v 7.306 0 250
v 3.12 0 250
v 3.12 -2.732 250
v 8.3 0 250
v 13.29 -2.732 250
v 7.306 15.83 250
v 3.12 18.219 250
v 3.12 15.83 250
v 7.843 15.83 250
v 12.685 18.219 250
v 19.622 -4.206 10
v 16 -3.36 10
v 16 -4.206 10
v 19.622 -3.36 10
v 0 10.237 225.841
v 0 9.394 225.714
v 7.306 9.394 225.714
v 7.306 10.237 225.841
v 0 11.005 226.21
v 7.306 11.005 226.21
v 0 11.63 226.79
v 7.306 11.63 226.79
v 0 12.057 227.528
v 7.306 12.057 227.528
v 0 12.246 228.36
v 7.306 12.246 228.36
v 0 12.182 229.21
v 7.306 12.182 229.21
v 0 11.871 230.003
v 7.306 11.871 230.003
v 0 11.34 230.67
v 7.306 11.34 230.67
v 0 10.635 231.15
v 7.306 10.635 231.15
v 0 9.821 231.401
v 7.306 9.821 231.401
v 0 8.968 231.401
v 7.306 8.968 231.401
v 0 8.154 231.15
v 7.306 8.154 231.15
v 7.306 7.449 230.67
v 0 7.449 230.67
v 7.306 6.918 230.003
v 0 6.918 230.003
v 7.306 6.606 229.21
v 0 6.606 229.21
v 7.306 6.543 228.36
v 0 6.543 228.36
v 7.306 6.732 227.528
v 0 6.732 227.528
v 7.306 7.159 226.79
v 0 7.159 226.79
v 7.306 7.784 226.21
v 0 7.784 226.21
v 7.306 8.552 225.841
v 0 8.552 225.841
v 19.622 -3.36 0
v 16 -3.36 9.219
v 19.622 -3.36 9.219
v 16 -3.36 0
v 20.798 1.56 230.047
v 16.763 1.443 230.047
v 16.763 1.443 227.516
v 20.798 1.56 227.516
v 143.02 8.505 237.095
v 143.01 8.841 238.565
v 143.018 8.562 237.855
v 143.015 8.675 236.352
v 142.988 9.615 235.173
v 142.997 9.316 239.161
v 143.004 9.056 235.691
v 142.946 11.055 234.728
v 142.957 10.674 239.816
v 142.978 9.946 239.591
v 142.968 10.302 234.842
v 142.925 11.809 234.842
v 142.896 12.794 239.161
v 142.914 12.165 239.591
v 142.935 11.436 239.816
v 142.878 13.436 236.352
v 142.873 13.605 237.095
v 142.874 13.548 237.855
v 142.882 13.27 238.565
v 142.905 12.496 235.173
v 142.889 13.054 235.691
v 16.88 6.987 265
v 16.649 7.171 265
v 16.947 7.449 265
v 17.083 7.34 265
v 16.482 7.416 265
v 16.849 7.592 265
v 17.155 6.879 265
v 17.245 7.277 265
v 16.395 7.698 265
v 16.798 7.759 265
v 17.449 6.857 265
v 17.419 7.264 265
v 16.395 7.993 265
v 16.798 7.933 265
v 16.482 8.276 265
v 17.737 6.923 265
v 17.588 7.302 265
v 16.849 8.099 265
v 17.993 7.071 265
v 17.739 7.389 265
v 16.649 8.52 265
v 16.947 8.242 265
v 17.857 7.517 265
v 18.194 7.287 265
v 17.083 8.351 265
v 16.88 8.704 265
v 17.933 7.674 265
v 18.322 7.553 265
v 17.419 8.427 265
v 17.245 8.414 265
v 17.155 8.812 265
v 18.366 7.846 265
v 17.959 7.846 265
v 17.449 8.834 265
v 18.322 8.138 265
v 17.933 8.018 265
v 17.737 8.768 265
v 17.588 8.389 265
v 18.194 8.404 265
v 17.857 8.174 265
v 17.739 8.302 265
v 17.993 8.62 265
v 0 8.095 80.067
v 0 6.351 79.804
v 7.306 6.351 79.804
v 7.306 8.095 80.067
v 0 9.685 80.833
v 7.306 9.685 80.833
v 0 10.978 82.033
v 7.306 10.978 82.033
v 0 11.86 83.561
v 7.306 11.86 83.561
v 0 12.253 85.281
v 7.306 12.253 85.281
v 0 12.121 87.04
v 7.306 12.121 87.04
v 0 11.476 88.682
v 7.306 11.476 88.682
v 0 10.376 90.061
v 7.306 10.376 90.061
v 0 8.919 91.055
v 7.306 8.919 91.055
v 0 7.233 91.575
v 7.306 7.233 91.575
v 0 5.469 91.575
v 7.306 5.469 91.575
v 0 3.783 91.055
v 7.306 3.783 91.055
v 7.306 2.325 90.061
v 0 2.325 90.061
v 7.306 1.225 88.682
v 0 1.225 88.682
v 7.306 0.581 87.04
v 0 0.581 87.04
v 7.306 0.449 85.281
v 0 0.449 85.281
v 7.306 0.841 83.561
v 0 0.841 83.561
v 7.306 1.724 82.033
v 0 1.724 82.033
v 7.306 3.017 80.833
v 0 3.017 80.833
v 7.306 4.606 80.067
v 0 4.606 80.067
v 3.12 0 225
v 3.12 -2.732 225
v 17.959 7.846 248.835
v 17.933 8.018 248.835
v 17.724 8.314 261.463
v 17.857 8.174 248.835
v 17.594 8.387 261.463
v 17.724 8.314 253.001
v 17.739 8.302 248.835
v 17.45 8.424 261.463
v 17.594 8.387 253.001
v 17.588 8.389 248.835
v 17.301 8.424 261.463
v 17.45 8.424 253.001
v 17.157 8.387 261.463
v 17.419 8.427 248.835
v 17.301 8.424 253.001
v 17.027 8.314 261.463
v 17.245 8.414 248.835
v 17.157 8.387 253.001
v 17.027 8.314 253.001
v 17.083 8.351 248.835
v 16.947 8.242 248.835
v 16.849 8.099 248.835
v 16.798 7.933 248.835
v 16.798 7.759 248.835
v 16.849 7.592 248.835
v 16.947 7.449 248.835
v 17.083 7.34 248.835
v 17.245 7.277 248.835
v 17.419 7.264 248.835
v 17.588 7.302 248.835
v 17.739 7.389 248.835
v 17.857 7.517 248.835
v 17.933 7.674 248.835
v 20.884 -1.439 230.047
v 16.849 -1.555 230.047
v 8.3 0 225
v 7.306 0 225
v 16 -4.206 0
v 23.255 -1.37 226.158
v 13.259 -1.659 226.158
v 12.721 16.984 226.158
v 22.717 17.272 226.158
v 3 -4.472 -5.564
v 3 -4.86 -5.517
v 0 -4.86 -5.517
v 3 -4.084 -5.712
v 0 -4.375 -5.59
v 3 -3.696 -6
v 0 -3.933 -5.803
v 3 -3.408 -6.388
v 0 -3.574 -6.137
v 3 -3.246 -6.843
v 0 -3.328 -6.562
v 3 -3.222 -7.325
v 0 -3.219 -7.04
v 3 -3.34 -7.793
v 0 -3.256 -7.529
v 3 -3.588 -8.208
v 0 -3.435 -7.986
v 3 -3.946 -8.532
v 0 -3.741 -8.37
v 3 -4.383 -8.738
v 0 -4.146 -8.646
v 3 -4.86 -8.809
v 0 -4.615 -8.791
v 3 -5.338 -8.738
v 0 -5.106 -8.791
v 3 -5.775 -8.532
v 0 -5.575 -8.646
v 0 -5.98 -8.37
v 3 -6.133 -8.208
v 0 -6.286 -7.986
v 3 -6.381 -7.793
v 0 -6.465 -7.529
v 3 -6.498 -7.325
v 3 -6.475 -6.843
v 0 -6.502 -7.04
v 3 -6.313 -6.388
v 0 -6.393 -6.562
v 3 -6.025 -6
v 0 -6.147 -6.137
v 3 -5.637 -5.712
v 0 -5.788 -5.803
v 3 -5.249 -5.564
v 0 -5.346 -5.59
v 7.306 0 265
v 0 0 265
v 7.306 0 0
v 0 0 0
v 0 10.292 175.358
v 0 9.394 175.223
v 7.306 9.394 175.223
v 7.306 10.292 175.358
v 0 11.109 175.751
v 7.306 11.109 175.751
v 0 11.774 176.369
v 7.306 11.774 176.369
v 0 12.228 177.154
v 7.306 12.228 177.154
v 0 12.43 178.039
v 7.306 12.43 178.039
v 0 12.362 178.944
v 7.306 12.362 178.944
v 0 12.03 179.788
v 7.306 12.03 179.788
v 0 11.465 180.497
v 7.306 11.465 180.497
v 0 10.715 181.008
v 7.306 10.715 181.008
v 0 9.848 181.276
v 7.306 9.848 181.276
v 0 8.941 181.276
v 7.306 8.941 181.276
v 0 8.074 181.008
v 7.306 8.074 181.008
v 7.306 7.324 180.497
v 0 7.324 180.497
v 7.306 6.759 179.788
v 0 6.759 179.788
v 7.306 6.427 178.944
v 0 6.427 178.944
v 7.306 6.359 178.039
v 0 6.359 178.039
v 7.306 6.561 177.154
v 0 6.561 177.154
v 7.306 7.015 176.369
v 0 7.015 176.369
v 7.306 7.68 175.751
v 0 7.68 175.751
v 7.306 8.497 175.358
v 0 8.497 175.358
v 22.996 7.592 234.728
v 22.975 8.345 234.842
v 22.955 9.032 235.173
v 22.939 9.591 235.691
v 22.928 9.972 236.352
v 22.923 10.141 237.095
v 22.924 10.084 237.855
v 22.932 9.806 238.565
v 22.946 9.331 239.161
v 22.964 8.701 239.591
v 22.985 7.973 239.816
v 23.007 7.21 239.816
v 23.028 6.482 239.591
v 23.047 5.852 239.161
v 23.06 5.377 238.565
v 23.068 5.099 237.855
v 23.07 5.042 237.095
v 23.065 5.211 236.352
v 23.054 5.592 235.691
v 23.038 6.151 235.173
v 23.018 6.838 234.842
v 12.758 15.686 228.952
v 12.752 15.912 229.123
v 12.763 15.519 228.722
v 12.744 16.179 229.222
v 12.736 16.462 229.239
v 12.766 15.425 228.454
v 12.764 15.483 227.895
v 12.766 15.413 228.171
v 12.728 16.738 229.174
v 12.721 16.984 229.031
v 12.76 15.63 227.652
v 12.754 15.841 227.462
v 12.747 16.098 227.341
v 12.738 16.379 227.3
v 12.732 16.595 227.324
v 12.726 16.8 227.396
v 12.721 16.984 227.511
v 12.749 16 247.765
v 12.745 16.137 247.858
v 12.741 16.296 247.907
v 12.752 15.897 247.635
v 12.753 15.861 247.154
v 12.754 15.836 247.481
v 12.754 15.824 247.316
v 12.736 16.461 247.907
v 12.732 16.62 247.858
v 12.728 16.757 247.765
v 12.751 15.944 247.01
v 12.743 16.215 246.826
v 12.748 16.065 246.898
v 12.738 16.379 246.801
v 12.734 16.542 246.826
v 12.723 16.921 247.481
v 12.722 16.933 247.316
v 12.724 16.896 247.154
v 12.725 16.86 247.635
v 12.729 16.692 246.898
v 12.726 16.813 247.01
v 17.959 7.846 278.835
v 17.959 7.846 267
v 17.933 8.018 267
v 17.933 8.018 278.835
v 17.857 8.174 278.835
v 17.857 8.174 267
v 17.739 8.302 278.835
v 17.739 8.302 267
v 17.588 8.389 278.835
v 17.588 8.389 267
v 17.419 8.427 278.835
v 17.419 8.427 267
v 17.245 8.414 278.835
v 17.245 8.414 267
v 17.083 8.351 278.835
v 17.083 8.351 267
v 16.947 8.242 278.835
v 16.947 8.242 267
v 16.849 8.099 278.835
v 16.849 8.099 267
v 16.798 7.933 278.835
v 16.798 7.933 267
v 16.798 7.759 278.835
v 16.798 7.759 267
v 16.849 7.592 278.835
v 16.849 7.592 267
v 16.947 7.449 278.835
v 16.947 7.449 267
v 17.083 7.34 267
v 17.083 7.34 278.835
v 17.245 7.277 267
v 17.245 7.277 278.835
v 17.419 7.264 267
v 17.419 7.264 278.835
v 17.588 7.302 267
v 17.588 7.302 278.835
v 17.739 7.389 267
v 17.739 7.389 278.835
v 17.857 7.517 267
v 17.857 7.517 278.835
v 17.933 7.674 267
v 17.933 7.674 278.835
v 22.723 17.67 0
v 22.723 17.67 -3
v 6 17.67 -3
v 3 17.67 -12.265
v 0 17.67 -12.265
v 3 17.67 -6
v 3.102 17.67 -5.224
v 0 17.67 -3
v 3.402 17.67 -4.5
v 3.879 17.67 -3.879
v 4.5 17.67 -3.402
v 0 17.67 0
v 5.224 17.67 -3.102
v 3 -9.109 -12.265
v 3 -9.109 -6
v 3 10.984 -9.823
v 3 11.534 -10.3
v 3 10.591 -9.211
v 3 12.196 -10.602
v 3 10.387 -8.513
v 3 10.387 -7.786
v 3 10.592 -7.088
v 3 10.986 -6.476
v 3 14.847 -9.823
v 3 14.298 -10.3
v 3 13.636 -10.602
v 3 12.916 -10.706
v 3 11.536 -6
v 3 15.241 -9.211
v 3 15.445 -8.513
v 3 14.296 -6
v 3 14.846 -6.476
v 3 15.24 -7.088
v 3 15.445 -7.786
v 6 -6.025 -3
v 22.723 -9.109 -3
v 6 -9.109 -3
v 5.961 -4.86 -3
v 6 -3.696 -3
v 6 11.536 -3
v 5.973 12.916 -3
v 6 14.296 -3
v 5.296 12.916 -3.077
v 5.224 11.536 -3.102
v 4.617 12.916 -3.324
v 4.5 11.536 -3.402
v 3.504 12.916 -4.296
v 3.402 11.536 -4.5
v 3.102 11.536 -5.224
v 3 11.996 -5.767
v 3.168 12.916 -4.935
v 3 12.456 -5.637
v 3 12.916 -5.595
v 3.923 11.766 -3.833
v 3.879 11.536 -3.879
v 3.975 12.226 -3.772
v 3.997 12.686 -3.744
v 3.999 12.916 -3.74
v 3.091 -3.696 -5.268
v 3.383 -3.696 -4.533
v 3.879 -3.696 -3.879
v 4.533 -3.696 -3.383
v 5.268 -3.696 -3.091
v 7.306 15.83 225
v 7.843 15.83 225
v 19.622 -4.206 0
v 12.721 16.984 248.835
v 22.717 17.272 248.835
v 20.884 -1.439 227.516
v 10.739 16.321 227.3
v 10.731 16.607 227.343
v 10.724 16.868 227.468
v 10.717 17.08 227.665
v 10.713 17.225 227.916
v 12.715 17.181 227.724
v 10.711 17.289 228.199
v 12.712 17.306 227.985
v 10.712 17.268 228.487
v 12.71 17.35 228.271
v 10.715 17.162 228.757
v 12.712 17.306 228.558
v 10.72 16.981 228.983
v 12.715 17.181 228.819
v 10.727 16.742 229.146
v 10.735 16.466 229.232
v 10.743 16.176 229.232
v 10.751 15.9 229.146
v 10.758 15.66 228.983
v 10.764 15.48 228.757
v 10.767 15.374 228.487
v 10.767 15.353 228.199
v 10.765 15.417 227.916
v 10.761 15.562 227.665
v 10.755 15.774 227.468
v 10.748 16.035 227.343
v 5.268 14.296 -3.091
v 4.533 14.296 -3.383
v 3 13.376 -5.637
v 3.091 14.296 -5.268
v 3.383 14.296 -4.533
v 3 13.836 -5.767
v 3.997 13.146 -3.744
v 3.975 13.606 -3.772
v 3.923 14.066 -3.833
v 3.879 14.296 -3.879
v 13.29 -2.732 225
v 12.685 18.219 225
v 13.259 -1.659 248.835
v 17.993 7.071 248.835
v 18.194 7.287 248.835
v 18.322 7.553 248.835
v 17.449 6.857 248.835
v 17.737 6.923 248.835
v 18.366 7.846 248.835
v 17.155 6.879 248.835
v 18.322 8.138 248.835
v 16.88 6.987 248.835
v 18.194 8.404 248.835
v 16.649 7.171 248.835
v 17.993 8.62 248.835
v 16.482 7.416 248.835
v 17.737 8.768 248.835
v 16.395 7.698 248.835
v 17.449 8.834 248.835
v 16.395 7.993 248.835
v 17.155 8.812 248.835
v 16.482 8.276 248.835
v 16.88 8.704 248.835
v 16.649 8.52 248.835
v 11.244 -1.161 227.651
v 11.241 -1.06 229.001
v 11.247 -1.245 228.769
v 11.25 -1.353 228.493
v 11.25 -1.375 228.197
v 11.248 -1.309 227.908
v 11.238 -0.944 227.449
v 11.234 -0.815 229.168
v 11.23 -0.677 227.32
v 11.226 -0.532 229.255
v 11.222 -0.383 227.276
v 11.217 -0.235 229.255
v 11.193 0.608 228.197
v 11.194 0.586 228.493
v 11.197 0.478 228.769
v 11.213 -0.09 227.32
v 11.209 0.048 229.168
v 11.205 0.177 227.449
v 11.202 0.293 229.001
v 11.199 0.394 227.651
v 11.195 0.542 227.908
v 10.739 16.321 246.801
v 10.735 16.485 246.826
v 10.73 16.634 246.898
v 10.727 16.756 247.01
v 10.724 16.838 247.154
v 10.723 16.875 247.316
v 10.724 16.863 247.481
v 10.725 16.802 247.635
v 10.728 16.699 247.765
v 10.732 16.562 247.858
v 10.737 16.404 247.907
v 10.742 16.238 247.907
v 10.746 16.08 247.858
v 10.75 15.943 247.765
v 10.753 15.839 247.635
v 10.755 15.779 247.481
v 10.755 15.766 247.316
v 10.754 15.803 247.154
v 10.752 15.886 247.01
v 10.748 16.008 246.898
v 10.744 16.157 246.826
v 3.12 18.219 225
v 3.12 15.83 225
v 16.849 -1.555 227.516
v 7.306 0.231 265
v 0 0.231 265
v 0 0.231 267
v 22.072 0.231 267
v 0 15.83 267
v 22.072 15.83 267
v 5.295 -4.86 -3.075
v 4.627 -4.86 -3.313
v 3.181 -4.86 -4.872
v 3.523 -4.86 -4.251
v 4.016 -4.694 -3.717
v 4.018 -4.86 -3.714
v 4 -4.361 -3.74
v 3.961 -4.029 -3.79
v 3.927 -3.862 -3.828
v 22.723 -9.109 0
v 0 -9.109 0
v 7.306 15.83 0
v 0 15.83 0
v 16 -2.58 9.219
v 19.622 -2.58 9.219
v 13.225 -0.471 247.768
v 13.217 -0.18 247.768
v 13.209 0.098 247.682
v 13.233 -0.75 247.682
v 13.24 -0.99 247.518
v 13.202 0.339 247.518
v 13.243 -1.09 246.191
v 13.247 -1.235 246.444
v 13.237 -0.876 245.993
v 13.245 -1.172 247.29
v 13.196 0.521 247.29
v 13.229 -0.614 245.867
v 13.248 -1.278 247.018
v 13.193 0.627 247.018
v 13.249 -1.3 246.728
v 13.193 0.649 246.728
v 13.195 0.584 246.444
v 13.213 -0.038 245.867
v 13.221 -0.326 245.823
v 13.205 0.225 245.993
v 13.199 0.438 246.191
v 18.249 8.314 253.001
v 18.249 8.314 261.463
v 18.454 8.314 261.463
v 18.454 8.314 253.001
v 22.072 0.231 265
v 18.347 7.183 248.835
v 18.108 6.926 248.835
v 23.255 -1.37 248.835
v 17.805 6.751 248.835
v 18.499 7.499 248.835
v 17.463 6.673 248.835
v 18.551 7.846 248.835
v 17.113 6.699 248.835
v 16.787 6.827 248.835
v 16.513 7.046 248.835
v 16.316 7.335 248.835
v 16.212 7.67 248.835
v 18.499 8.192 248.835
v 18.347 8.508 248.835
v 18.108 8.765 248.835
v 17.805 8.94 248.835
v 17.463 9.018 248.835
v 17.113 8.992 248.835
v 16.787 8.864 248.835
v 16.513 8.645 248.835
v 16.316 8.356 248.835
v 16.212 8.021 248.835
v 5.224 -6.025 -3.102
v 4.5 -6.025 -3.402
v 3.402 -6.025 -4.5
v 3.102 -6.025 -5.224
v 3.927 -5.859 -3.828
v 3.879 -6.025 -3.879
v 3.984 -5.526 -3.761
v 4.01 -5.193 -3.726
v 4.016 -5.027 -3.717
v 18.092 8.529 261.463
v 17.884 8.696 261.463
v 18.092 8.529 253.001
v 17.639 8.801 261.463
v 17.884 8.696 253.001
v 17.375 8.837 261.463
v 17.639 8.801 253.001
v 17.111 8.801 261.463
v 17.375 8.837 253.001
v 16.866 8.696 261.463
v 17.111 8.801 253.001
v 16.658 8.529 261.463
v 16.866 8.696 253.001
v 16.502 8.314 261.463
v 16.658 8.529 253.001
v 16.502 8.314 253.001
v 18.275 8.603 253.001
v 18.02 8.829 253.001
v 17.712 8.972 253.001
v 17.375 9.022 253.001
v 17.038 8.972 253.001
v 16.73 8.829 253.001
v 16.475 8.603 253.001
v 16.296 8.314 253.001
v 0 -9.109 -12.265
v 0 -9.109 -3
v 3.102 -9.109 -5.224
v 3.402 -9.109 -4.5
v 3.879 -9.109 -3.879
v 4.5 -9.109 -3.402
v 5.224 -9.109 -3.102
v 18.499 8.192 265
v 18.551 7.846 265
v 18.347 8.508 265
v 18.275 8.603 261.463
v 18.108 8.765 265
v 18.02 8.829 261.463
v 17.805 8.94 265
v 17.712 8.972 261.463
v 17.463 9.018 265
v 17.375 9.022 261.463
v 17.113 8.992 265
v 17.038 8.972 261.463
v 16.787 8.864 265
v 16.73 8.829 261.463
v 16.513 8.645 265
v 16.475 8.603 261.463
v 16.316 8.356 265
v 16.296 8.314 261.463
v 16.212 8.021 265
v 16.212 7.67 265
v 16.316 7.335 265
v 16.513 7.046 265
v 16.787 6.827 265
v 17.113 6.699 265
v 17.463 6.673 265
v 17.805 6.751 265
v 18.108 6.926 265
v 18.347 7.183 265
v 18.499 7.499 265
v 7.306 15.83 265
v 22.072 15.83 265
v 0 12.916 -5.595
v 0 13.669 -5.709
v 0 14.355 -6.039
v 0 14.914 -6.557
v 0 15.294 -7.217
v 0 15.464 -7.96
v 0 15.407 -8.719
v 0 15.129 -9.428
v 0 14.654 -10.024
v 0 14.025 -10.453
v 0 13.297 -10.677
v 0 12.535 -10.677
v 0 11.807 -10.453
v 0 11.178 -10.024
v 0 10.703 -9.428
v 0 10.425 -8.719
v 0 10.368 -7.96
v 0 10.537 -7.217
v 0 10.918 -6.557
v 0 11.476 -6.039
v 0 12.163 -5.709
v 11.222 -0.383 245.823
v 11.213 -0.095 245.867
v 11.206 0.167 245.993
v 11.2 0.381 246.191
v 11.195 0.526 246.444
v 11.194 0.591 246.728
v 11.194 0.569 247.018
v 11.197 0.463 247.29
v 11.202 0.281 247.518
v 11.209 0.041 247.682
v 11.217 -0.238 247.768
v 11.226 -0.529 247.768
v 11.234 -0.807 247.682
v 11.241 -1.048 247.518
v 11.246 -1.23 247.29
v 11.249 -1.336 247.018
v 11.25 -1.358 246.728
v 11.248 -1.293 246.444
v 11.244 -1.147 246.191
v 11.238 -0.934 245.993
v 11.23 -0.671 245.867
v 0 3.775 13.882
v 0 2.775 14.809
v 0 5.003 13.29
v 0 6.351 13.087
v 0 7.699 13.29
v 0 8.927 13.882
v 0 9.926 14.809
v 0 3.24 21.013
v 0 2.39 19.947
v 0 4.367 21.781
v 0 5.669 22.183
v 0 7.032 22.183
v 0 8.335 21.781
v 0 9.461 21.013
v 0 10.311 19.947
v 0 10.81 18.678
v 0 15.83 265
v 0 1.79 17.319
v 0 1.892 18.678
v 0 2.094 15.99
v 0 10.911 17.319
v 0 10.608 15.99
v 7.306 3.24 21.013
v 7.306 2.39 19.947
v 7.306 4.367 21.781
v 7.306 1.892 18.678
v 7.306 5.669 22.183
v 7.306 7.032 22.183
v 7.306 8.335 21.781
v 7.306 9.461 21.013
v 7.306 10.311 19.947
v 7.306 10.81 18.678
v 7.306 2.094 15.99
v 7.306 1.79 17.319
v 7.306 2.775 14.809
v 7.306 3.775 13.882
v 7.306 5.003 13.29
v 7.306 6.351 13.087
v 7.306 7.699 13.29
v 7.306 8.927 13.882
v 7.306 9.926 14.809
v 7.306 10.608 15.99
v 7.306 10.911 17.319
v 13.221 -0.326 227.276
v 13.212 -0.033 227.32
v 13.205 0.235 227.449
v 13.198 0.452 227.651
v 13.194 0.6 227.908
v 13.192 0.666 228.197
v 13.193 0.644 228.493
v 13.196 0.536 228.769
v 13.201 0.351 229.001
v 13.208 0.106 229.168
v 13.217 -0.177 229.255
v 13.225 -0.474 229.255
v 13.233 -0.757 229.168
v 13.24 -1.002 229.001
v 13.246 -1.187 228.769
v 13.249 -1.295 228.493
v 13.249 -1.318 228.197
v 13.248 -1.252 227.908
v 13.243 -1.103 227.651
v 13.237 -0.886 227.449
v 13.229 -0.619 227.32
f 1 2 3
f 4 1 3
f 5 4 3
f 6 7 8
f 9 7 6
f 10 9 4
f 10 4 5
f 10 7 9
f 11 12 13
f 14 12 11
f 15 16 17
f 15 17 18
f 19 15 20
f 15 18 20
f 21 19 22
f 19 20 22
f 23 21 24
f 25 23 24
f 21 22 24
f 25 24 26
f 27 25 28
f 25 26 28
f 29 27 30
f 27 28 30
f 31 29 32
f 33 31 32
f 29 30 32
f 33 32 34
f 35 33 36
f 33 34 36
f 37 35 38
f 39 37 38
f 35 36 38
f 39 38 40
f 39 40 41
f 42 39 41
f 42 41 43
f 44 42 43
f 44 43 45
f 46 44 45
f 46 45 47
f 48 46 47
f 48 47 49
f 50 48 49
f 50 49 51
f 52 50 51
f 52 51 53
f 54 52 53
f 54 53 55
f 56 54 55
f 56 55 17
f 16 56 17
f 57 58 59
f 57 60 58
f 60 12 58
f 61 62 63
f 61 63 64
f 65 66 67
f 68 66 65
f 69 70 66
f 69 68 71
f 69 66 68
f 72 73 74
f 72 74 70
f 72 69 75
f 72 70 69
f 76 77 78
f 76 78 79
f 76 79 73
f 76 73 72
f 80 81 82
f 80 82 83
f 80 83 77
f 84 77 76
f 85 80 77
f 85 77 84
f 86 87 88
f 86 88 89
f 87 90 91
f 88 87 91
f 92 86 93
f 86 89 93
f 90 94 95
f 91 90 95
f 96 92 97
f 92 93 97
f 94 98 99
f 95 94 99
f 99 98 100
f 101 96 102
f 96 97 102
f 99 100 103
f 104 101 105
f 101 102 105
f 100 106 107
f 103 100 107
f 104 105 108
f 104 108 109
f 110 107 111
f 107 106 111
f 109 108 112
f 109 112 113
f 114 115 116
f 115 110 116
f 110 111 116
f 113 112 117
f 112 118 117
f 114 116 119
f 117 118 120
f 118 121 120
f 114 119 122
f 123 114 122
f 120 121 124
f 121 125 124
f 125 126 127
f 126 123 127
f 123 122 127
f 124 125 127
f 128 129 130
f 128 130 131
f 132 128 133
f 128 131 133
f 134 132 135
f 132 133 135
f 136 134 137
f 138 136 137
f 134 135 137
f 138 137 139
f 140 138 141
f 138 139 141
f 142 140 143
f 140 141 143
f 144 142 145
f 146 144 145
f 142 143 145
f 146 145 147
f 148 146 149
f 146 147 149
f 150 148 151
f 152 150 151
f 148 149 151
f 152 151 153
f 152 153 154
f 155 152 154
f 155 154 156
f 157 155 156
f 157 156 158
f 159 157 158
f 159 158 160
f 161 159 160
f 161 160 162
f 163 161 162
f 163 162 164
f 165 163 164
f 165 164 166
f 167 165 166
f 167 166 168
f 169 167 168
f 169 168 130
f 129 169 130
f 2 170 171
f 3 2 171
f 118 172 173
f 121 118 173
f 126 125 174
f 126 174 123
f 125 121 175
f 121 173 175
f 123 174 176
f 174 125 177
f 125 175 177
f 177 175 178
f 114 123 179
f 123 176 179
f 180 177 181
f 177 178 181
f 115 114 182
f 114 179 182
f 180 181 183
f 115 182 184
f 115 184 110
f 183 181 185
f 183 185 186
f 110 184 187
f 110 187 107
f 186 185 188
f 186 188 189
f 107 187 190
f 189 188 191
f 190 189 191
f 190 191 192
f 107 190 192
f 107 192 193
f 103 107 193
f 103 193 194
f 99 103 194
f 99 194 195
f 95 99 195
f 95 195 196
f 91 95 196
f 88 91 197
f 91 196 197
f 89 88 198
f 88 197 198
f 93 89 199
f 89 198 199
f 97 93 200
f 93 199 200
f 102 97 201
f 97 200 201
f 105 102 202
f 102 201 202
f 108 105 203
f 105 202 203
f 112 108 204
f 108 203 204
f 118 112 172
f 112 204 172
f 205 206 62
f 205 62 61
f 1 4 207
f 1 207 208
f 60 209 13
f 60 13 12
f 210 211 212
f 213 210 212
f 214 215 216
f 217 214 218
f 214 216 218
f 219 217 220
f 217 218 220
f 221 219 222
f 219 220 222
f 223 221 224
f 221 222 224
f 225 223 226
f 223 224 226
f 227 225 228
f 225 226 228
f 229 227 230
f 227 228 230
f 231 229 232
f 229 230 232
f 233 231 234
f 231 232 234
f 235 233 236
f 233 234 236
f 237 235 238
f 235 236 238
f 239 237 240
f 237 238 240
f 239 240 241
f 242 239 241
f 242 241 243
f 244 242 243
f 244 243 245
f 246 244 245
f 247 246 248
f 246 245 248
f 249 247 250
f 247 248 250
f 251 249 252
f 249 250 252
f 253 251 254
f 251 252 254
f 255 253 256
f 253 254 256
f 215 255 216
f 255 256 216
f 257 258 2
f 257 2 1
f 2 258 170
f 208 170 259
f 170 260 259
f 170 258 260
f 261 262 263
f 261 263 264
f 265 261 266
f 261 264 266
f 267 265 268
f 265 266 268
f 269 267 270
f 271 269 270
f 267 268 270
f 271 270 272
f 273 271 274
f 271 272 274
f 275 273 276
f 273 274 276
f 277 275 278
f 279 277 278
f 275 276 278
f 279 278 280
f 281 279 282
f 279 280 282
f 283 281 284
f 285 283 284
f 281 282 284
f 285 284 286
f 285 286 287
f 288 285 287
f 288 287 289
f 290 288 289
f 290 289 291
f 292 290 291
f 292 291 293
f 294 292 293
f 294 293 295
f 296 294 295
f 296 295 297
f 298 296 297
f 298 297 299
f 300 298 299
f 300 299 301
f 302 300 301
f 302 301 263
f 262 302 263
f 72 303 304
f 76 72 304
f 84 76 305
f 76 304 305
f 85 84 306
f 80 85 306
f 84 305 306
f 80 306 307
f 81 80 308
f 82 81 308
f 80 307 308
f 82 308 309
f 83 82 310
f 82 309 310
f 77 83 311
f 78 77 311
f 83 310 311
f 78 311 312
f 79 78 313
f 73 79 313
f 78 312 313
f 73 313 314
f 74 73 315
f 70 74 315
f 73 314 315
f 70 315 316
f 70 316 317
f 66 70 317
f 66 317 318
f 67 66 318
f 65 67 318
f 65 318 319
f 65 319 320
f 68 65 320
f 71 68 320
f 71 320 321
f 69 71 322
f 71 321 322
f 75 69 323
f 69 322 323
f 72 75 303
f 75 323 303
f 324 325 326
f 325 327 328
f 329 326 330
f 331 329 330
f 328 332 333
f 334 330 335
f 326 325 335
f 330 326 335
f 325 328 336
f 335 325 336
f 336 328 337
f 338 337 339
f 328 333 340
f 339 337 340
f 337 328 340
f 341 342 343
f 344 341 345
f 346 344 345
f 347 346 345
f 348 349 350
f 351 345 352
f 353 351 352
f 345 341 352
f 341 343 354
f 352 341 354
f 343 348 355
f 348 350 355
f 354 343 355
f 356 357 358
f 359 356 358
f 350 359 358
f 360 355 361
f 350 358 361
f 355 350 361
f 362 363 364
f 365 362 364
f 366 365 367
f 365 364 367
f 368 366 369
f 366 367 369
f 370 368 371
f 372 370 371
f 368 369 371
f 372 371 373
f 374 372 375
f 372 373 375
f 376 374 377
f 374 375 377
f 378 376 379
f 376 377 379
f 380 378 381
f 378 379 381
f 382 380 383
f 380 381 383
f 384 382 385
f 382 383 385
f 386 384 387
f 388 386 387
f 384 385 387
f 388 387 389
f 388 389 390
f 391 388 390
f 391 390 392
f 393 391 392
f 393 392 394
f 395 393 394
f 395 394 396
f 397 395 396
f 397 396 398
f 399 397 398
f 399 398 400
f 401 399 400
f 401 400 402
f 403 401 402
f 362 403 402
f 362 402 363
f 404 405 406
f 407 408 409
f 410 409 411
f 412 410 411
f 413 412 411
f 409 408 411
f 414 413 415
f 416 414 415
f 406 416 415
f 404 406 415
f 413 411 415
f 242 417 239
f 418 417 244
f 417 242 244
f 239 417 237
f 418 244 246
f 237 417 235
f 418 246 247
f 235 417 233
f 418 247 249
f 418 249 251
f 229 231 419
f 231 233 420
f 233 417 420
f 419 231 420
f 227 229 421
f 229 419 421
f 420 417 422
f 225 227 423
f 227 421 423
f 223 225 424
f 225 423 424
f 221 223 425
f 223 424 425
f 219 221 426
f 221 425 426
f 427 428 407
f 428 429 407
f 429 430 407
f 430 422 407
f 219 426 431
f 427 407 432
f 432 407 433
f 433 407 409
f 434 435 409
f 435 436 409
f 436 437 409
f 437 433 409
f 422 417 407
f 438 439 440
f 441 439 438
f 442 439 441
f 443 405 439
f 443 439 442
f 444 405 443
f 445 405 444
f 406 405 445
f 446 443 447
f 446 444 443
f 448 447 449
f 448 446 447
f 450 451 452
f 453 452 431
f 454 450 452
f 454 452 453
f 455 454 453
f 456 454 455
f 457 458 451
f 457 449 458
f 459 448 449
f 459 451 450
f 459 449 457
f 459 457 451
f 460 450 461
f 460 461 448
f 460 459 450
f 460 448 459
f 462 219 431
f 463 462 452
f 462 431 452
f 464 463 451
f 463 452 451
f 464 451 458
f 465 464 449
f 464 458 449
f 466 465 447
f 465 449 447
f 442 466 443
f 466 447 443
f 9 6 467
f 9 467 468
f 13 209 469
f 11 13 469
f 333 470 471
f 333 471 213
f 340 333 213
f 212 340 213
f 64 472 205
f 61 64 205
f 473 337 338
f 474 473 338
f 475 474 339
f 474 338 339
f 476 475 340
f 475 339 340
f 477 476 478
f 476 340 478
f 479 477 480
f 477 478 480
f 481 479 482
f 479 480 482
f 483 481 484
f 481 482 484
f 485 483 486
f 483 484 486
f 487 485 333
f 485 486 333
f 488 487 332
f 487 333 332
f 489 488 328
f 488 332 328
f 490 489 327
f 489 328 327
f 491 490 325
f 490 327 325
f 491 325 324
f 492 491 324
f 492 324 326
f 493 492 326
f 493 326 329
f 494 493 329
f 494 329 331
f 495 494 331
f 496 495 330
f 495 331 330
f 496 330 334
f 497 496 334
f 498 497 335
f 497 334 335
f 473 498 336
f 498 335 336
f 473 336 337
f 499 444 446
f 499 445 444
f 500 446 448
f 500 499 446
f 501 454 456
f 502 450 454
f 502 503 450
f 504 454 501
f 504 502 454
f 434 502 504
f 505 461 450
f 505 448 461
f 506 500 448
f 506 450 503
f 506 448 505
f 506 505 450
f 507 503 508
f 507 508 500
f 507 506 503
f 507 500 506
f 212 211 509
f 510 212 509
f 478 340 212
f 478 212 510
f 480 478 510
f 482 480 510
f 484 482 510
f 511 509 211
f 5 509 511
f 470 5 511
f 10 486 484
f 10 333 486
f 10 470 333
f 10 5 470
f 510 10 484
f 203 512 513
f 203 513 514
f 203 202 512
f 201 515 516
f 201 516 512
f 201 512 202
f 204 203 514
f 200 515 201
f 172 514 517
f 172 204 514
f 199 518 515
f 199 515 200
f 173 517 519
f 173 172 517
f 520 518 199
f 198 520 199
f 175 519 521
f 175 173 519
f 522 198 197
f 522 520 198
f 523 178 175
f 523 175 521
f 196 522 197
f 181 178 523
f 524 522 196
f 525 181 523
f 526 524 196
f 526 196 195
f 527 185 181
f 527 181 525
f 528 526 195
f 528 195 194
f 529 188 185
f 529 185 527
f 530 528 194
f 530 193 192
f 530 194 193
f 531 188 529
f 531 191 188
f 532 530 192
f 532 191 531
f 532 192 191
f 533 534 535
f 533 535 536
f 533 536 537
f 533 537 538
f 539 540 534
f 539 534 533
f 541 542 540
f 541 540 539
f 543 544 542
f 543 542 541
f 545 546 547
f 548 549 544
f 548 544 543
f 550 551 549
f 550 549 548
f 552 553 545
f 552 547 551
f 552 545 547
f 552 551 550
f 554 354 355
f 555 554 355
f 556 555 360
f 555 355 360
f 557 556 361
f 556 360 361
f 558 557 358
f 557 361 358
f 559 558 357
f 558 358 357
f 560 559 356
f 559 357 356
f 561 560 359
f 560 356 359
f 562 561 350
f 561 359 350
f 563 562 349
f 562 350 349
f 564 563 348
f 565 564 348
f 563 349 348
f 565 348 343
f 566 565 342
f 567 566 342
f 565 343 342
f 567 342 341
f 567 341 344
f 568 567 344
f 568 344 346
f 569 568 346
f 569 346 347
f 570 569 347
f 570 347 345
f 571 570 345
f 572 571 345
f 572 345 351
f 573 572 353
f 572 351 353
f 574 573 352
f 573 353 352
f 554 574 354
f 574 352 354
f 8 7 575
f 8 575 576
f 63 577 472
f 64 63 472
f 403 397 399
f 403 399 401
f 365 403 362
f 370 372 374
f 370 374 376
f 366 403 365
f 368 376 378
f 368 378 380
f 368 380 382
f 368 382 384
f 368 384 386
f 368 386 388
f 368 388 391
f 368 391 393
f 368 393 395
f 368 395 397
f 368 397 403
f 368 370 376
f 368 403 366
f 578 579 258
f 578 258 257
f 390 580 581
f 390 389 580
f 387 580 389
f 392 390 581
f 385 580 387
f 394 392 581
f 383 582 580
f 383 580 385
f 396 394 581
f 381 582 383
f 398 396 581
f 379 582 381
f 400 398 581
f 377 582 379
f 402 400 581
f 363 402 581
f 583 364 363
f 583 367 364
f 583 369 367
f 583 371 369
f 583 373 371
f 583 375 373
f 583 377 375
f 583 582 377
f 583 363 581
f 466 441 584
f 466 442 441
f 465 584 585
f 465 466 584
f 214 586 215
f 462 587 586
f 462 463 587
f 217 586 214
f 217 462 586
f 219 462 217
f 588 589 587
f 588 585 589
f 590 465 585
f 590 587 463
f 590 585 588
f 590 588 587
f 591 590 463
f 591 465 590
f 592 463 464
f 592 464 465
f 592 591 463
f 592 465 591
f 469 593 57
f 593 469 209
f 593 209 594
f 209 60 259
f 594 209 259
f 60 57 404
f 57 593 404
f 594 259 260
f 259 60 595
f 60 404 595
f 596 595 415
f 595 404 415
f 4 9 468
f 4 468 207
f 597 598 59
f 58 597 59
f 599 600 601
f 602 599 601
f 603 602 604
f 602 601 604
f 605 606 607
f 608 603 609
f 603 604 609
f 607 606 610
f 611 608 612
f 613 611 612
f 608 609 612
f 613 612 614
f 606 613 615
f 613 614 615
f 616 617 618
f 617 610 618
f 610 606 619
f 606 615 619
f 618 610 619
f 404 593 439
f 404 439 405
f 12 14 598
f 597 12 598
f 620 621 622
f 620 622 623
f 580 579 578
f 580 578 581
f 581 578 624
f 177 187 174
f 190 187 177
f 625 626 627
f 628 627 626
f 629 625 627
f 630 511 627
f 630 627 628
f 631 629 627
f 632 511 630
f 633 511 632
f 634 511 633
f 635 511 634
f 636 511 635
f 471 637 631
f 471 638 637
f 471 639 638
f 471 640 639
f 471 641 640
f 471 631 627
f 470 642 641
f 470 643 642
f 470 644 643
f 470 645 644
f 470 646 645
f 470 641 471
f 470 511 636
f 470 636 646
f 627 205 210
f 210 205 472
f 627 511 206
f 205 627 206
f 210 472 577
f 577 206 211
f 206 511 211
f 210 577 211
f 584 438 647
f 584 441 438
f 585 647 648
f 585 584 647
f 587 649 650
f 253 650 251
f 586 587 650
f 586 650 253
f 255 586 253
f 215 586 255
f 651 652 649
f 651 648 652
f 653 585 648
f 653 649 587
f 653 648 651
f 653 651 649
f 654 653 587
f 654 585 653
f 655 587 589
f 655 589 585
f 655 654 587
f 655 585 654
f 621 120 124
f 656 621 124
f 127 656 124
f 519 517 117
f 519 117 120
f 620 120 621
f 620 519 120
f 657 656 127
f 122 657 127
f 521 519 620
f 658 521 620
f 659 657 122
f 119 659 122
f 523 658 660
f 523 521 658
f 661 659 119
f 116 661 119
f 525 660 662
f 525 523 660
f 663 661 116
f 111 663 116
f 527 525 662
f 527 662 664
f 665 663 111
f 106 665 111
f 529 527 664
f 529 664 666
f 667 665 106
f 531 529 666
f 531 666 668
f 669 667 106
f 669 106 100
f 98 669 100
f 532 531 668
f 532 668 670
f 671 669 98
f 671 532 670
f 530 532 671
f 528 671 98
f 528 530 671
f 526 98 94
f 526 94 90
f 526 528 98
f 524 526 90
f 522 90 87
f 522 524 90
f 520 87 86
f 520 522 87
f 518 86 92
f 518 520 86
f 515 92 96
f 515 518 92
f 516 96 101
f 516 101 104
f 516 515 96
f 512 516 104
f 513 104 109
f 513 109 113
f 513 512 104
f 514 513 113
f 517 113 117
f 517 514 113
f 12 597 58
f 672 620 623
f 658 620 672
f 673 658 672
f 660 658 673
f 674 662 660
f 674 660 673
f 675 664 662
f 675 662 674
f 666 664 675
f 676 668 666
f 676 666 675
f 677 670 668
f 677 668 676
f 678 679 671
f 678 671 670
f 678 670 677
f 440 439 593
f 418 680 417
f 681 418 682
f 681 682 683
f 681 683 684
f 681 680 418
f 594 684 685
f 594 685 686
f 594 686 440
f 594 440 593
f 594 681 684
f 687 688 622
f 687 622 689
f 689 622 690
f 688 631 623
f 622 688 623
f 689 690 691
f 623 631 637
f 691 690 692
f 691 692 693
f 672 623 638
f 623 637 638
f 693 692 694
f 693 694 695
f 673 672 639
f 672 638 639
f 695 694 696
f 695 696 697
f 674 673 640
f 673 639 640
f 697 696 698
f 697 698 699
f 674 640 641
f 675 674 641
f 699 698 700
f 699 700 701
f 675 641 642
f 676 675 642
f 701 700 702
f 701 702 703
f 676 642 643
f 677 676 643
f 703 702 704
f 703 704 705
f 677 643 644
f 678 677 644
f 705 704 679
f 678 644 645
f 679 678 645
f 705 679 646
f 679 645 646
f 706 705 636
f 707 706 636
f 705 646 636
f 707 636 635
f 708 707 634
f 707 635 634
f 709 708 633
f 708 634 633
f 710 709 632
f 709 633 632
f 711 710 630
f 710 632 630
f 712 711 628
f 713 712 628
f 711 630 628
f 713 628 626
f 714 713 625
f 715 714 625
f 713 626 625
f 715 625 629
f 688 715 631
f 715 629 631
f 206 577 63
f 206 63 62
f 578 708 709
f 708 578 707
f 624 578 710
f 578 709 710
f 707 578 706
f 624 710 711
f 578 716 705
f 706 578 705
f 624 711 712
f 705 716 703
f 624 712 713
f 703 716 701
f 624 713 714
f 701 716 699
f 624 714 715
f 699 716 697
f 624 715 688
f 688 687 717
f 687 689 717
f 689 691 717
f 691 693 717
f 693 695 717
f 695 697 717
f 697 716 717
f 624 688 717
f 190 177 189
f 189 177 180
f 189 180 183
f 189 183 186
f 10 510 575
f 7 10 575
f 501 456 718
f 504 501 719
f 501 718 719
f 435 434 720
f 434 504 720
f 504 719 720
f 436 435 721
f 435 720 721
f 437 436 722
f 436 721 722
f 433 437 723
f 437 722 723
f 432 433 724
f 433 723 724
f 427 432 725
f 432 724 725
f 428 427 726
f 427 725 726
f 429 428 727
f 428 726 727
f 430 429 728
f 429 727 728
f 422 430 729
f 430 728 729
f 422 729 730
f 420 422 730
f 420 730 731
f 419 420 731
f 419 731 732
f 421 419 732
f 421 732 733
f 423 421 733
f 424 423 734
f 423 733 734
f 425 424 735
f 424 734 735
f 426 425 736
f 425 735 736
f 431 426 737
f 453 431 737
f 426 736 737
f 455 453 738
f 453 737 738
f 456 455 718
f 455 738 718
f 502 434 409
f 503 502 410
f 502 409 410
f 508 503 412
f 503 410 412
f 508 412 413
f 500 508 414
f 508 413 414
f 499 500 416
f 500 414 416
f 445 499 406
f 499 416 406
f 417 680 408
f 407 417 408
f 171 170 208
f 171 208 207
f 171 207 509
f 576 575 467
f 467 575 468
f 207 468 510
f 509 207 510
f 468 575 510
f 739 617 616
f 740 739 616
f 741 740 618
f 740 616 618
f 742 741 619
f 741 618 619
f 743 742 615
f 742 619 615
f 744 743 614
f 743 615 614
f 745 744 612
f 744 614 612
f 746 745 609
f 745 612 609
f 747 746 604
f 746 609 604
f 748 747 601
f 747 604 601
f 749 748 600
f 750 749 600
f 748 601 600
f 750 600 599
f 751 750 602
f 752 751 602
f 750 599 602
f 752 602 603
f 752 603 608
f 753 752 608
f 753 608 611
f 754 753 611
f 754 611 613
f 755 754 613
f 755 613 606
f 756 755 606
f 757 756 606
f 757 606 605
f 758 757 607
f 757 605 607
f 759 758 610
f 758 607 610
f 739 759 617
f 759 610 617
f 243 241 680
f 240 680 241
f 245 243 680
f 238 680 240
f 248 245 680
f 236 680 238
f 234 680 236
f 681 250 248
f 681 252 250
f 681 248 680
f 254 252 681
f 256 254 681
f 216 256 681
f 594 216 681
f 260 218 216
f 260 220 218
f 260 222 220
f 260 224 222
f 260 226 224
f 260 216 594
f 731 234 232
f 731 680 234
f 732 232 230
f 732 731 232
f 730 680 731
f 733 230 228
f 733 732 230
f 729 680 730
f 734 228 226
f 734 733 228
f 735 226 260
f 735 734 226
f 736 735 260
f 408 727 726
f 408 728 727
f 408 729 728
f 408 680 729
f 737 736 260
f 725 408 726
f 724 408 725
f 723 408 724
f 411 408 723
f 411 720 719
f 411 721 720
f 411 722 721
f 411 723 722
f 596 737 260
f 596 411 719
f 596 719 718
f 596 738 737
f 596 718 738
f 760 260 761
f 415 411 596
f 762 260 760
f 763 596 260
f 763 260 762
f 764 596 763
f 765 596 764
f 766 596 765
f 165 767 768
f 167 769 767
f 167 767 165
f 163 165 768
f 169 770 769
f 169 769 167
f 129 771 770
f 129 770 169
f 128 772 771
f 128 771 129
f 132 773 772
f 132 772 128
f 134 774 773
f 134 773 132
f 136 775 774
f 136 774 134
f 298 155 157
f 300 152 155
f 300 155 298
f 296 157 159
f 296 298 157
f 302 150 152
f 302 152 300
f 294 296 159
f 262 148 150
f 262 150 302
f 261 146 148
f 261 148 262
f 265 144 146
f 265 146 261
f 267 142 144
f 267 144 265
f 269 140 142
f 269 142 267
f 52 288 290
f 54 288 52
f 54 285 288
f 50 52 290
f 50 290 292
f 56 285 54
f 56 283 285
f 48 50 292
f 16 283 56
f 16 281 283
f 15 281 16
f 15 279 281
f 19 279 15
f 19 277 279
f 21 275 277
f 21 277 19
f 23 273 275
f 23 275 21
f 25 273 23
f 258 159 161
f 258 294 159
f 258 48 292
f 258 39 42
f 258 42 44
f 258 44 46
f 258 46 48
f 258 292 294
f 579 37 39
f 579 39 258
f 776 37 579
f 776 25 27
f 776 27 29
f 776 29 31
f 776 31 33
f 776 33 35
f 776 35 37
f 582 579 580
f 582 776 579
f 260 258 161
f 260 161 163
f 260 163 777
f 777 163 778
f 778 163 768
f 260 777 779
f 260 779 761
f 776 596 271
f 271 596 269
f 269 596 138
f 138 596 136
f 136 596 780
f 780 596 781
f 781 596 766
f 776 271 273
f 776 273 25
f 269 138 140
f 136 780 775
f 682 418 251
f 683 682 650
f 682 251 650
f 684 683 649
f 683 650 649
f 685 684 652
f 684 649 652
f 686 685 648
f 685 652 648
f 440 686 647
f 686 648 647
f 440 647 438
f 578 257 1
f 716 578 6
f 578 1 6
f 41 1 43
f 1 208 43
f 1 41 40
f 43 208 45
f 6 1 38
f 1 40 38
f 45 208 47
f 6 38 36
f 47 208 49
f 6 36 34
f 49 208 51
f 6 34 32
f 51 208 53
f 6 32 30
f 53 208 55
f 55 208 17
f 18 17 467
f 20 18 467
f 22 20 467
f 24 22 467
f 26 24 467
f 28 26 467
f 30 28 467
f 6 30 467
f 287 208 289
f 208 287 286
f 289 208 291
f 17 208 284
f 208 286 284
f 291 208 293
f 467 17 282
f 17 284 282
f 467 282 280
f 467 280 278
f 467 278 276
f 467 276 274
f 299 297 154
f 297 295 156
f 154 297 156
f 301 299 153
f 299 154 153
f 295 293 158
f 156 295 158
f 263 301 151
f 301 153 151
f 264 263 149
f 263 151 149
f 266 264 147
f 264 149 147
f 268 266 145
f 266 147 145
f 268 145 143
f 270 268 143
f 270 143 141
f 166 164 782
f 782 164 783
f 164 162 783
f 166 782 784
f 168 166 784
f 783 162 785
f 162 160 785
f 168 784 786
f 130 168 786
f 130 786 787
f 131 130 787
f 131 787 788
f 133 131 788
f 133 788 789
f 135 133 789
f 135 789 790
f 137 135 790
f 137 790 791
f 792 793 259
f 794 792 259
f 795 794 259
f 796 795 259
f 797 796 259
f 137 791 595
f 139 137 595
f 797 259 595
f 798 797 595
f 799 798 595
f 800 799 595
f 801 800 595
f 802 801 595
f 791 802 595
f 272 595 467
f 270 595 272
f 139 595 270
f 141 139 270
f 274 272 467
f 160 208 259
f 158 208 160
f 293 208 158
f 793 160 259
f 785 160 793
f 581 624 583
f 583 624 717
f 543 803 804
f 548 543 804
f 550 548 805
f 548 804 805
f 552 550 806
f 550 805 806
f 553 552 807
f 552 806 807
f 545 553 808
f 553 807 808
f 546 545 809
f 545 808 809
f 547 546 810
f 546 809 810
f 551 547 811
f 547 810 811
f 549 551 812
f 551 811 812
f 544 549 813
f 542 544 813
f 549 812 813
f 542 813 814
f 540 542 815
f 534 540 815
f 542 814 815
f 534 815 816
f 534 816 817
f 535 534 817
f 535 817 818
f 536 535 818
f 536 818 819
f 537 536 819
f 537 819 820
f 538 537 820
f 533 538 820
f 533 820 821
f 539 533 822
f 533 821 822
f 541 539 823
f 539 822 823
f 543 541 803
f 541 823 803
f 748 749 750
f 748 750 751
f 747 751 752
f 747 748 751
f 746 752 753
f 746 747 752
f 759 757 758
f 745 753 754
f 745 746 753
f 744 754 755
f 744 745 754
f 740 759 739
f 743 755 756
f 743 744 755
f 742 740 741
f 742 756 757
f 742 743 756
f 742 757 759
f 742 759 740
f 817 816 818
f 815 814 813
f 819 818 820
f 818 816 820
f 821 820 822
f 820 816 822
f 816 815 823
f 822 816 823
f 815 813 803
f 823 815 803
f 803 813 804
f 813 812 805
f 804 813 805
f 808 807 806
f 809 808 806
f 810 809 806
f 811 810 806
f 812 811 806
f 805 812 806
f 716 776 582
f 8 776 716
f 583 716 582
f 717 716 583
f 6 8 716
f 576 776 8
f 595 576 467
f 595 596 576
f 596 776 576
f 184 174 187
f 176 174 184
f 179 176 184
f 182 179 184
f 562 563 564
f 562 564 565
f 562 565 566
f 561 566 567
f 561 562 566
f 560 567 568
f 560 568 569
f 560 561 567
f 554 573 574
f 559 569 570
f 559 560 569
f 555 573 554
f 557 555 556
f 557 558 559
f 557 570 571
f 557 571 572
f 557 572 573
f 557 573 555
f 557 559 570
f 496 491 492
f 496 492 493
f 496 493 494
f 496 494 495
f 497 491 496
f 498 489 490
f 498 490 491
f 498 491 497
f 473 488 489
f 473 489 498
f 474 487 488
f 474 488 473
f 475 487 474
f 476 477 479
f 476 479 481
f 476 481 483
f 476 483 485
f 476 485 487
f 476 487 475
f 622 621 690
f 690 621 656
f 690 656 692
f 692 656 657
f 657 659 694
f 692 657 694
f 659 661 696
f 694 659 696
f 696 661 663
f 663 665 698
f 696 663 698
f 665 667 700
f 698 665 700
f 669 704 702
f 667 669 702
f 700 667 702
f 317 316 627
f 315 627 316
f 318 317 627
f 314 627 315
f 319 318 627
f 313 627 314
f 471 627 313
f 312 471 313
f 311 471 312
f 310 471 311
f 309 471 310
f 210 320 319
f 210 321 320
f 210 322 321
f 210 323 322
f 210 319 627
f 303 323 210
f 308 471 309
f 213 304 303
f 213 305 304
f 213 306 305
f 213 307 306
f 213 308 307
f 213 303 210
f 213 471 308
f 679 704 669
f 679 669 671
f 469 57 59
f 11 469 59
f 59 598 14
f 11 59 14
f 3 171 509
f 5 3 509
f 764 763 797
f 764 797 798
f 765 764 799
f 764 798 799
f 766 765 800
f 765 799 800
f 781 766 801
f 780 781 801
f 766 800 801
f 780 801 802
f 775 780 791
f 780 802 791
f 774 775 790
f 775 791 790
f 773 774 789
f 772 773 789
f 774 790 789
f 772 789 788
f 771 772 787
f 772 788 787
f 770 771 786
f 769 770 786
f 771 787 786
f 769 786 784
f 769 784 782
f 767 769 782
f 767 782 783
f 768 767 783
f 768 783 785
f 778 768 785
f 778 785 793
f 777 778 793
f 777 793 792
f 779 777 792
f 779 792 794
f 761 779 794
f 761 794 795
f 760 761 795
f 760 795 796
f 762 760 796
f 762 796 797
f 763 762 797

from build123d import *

# Parameters (mm, degrees)
SKETCH1_W            = 7.305999503
SKETCH1_H            = 15.829665589
BOSS_EXTRUDE1_DEPTH  = 250
SKETCH2_R            = 2.859737651
SKETCH2_R_2          = 3.043630703
SKETCH2_R_3          = 5.918472751
SKETCH2_R_4          = 4.573365308
CUT_EXTRUDE1_DEPTH   = 250
BOSS_EXTRUDE2_DEPTH  = 25
SKETCH4_R            = 0.55626985
SKETCH4_R_2          = 0.971483528
SKETCH4_R_3          = 0.995085758
SKETCH4_R_4          = 0.977672137
CUT_EXTRUDE2_DEPTH   = 2
SKETCH5_W            = 22.677292764
SKETCH5_H            = 18.650483769
BOSS_EXTRUDE3_DEPTH  = 10
SKETCH7_W            = 7.305999503
SKETCH7_H            = 15.829665589
BOSS_EXTRUDE4_DEPTH  = 15
SKETCH8_R            = 0.583511753
BOSS_EXTRUDE5_DEPTH  = 30
SKETCH10_R           = 1.176105539
SKETCH10_R_2         = 0.991111504
BOSS_EXTRUDE6_DEPTH  = 16.164956
SKETCH11_W           = 22.072449834
SKETCH11_H           = 15.598961577
SKETCH11_R           = 0.583511753
BOSS_EXTRUDE7_DEPTH  = 2
SKETCH12_W           = 8.462475972
SKETCH12_H           = 0.708060972
CUT_EXTRUDE3_DEPTH   = 16.949179392
SKETCH13_R           = 2.558098884
BOSS_EXTRUDE8_DEPTH  = 120
SKETCH14_W           = 4.036675172
SKETCH14_H           = 2.530453093
CUT_EXTRUDE4_DEPTH   = 3
SKETCH15_W           = 22.723161813
SKETCH15_H           = 26.77895865
BOSS_EXTRUDE9_DEPTH  = 3
SKETCH16_W           = 3.62280941
SKETCH16_H           = 0.845659338
BOSS_EXTRUDE10_DEPTH = 10
BOSS_EXTRUDE11_DEPTH = 3.622809
SKETCH20_W           = 9.26545532
SKETCH20_H           = 26.77895865
SKETCH20_R           = 2.555213065
SKETCH20_R_2         = 1.645957428
BOSS_EXTRUDE12_DEPTH = 3
FILLET1_R            = 3


with BuildPart() as part:
    # Sketch1 → Boss-Extrude1 (new body)
    with BuildSketch(Plane.XY):
        with Locations((3.652999752, 7.914832795)):
            Rectangle(SKETCH1_W, SKETCH1_H)
    extrude(amount=BOSS_EXTRUDE1_DEPTH)

    # Sketch2 → Cut-Extrude1 (cut)
    with BuildSketch(Plane(origin=(7.305999503, 0, 0), x_dir=(0, 0, -1), z_dir=(1, 0, 0))):
        with Locations((-228.573273141, 9.394450982)):
            Circle(SKETCH2_R)
        with Locations((-178.266254758, 9.394450982)):
            Circle(SKETCH2_R_2)
        with Locations((-85.722862653, 6.350820279)):
            Circle(SKETCH2_R_3)
        with Locations((-17.660426017, 6.350820279)):
            Circle(SKETCH2_R_4)
    extrude(amount=-CUT_EXTRUDE1_DEPTH, mode=Mode.SUBTRACT)

    # Sketch3 → Boss-Extrude2 (add)
    with BuildSketch(Plane.XY.offset(250)):
        Polygon((3.119708773, 18.218776332), (3.119708773, 15.829665589), (7.843143149, 15.829665589), (8.300249701, 0), (3.119708773, 0), (3.119708773, -2.731940657), (13.290329566, -2.731940657), (12.68534458, 18.218776332), align=None)
    extrude(amount=-BOSS_EXTRUDE2_DEPTH)

    # Sketch4 → Cut-Extrude2 (cut)
    with BuildSketch(Plane(origin=(13.200433203, 0.381183322, 0), x_dir=(0, 0, -1), z_dir=(0.999583332, 0.028864545, 0))):
        with Locations((-247.357123666, 16.004078596)):
            Circle(SKETCH4_R)
        with Locations((-228.271108715, 16.004078596)):
            Circle(SKETCH4_R_2)
        with Locations((-228.271108715, -0.707178735)):
            Circle(SKETCH4_R_3)
        with Locations((-246.800853817, -0.707178735)):
            Circle(SKETCH4_R_4)
    extrude(amount=-CUT_EXTRUDE2_DEPTH, mode=Mode.SUBTRACT)

    # Sketch5 → Boss-Extrude3 (add)
    with BuildSketch(Plane(origin=(13.200433203, 0.381183322, 0), x_dir=(0, 0, -1), z_dir=(0.999583332, 0.028864545, 0))):
        with Locations((-237.496397387, 7.284247631)):
            Rectangle(SKETCH5_W, SKETCH5_H)
    extrude(amount=BOSS_EXTRUDE3_DEPTH)

    # Sketch7 → Boss-Extrude4 (add)
    with BuildSketch(Plane.XY.offset(250)):
        with Locations((3.652999752, 7.914832795)):
            Rectangle(SKETCH7_W, SKETCH7_H)
    extrude(amount=BOSS_EXTRUDE4_DEPTH)

    # Sketch8 → Boss-Extrude5 (add)
    with BuildSketch(Plane.XY.offset(248.835043769)):
        with Locations((17.375180219, 7.845532394)):
            Circle(SKETCH8_R)
    extrude(amount=BOSS_EXTRUDE5_DEPTH)

    # Sketch10 → Boss-Extrude6 (add)
    with BuildSketch(Plane.XY.offset(248.835043769)):
        with Locations((17.375180219, 7.845532394)):
            Circle(SKETCH10_R)
        with Locations((17.375180219, 7.845532394)):
            Circle(SKETCH10_R_2, mode=Mode.SUBTRACT)
    extrude(amount=BOSS_EXTRUDE6_DEPTH)

    # Sketch11 → Boss-Extrude7 (add)
    with BuildSketch(Plane.XY.offset(265)):
        with Locations((11.036224917, 8.030184801)):
            Rectangle(SKETCH11_W, SKETCH11_H)
        with Locations((17.375180219, 7.845532394)):
            Circle(SKETCH11_R, mode=Mode.SUBTRACT)
    extrude(amount=BOSS_EXTRUDE7_DEPTH)

    # Sketch12 → Cut-Extrude3 (cut, through all)
    with BuildSketch(Plane(origin=(7.305999503, 0, 0), x_dir=(0, 0, -1), z_dir=(1, 0, 0))):
        with Locations((-257.232117953, 8.667607447)):
            Rectangle(SKETCH12_W, SKETCH12_H)
    extrude(amount=CUT_EXTRUDE3_DEPTH, mode=Mode.SUBTRACT)

    # Sketch13 → Boss-Extrude8 (add)
    with BuildSketch(Plane(origin=(23.196266525, 0.669828769, 0), x_dir=(0, 0, -1), z_dir=(0.999583332, 0.028864545, 0))):
        with Locations((-237.28625307, 6.924561564)):
            Circle(SKETCH13_R)
    extrude(amount=BOSS_EXTRUDE8_DEPTH)

    # Sketch14 → Cut-Extrude4 (cut)
    with BuildSketch(Plane(origin=(0.05891237, -2.040143836, 0), x_dir=(0.999583332, 0.028864545, 0), z_dir=(0.028864545, -0.999583332, 0))):
        with Locations((18.81578383, 228.781338254)):
            Rectangle(SKETCH14_W, SKETCH14_H)
    extrude(amount=-CUT_EXTRUDE4_DEPTH, mode=Mode.SUBTRACT)

    # Sketch15 → Boss-Extrude9 (add)
    with BuildSketch(Plane(origin=(0, 0, 0), x_dir=(-1, 0, 0), z_dir=(0, 0, -1))):
        with Locations((-11.361580907, 4.28062146)):
            Rectangle(SKETCH15_W, SKETCH15_H)
    extrude(amount=BOSS_EXTRUDE9_DEPTH)

    # Sketch16 → Boss-Extrude10 (add)
    with BuildSketch(Plane.XY):
        with Locations((17.811006308, -3.783209828)):
            Rectangle(SKETCH16_W, SKETCH16_H)
    extrude(amount=BOSS_EXTRUDE10_DEPTH)

    # Sketch17 → Boss-Extrude11 (add)
    with BuildSketch(Plane(origin=(19.622411013, 0, 0), x_dir=(0, 0, -1), z_dir=(1, 0, 0))):
        Polygon((-10, -3.360380159), (-9.219259529, -2.579639689), (-9.219259529, -3.360380159), align=None)
    extrude(amount=-BOSS_EXTRUDE11_DEPTH)

    # Sketch20 → Boss-Extrude12 (add)
    with BuildSketch(Plane.ZY):
        with Locations((-7.63272766, 4.28062146)):
            Rectangle(SKETCH20_W, SKETCH20_H)
        with Locations((-8.150644595, 12.915896002)):
            Circle(SKETCH20_R, mode=Mode.SUBTRACT)
        with Locations((-7.163070138, -4.86044422)):
            Circle(SKETCH20_R_2, mode=Mode.SUBTRACT)
    extrude(amount=-BOSS_EXTRUDE12_DEPTH)

    # Fillet1
    fillet1_edges = [part.edges().sort_by_distance(p)[0] for p in [
        (3, 4.28062146, -3),
    ]]
    fillet(fillet1_edges, radius=FILLET1_R)


solid = part.part
